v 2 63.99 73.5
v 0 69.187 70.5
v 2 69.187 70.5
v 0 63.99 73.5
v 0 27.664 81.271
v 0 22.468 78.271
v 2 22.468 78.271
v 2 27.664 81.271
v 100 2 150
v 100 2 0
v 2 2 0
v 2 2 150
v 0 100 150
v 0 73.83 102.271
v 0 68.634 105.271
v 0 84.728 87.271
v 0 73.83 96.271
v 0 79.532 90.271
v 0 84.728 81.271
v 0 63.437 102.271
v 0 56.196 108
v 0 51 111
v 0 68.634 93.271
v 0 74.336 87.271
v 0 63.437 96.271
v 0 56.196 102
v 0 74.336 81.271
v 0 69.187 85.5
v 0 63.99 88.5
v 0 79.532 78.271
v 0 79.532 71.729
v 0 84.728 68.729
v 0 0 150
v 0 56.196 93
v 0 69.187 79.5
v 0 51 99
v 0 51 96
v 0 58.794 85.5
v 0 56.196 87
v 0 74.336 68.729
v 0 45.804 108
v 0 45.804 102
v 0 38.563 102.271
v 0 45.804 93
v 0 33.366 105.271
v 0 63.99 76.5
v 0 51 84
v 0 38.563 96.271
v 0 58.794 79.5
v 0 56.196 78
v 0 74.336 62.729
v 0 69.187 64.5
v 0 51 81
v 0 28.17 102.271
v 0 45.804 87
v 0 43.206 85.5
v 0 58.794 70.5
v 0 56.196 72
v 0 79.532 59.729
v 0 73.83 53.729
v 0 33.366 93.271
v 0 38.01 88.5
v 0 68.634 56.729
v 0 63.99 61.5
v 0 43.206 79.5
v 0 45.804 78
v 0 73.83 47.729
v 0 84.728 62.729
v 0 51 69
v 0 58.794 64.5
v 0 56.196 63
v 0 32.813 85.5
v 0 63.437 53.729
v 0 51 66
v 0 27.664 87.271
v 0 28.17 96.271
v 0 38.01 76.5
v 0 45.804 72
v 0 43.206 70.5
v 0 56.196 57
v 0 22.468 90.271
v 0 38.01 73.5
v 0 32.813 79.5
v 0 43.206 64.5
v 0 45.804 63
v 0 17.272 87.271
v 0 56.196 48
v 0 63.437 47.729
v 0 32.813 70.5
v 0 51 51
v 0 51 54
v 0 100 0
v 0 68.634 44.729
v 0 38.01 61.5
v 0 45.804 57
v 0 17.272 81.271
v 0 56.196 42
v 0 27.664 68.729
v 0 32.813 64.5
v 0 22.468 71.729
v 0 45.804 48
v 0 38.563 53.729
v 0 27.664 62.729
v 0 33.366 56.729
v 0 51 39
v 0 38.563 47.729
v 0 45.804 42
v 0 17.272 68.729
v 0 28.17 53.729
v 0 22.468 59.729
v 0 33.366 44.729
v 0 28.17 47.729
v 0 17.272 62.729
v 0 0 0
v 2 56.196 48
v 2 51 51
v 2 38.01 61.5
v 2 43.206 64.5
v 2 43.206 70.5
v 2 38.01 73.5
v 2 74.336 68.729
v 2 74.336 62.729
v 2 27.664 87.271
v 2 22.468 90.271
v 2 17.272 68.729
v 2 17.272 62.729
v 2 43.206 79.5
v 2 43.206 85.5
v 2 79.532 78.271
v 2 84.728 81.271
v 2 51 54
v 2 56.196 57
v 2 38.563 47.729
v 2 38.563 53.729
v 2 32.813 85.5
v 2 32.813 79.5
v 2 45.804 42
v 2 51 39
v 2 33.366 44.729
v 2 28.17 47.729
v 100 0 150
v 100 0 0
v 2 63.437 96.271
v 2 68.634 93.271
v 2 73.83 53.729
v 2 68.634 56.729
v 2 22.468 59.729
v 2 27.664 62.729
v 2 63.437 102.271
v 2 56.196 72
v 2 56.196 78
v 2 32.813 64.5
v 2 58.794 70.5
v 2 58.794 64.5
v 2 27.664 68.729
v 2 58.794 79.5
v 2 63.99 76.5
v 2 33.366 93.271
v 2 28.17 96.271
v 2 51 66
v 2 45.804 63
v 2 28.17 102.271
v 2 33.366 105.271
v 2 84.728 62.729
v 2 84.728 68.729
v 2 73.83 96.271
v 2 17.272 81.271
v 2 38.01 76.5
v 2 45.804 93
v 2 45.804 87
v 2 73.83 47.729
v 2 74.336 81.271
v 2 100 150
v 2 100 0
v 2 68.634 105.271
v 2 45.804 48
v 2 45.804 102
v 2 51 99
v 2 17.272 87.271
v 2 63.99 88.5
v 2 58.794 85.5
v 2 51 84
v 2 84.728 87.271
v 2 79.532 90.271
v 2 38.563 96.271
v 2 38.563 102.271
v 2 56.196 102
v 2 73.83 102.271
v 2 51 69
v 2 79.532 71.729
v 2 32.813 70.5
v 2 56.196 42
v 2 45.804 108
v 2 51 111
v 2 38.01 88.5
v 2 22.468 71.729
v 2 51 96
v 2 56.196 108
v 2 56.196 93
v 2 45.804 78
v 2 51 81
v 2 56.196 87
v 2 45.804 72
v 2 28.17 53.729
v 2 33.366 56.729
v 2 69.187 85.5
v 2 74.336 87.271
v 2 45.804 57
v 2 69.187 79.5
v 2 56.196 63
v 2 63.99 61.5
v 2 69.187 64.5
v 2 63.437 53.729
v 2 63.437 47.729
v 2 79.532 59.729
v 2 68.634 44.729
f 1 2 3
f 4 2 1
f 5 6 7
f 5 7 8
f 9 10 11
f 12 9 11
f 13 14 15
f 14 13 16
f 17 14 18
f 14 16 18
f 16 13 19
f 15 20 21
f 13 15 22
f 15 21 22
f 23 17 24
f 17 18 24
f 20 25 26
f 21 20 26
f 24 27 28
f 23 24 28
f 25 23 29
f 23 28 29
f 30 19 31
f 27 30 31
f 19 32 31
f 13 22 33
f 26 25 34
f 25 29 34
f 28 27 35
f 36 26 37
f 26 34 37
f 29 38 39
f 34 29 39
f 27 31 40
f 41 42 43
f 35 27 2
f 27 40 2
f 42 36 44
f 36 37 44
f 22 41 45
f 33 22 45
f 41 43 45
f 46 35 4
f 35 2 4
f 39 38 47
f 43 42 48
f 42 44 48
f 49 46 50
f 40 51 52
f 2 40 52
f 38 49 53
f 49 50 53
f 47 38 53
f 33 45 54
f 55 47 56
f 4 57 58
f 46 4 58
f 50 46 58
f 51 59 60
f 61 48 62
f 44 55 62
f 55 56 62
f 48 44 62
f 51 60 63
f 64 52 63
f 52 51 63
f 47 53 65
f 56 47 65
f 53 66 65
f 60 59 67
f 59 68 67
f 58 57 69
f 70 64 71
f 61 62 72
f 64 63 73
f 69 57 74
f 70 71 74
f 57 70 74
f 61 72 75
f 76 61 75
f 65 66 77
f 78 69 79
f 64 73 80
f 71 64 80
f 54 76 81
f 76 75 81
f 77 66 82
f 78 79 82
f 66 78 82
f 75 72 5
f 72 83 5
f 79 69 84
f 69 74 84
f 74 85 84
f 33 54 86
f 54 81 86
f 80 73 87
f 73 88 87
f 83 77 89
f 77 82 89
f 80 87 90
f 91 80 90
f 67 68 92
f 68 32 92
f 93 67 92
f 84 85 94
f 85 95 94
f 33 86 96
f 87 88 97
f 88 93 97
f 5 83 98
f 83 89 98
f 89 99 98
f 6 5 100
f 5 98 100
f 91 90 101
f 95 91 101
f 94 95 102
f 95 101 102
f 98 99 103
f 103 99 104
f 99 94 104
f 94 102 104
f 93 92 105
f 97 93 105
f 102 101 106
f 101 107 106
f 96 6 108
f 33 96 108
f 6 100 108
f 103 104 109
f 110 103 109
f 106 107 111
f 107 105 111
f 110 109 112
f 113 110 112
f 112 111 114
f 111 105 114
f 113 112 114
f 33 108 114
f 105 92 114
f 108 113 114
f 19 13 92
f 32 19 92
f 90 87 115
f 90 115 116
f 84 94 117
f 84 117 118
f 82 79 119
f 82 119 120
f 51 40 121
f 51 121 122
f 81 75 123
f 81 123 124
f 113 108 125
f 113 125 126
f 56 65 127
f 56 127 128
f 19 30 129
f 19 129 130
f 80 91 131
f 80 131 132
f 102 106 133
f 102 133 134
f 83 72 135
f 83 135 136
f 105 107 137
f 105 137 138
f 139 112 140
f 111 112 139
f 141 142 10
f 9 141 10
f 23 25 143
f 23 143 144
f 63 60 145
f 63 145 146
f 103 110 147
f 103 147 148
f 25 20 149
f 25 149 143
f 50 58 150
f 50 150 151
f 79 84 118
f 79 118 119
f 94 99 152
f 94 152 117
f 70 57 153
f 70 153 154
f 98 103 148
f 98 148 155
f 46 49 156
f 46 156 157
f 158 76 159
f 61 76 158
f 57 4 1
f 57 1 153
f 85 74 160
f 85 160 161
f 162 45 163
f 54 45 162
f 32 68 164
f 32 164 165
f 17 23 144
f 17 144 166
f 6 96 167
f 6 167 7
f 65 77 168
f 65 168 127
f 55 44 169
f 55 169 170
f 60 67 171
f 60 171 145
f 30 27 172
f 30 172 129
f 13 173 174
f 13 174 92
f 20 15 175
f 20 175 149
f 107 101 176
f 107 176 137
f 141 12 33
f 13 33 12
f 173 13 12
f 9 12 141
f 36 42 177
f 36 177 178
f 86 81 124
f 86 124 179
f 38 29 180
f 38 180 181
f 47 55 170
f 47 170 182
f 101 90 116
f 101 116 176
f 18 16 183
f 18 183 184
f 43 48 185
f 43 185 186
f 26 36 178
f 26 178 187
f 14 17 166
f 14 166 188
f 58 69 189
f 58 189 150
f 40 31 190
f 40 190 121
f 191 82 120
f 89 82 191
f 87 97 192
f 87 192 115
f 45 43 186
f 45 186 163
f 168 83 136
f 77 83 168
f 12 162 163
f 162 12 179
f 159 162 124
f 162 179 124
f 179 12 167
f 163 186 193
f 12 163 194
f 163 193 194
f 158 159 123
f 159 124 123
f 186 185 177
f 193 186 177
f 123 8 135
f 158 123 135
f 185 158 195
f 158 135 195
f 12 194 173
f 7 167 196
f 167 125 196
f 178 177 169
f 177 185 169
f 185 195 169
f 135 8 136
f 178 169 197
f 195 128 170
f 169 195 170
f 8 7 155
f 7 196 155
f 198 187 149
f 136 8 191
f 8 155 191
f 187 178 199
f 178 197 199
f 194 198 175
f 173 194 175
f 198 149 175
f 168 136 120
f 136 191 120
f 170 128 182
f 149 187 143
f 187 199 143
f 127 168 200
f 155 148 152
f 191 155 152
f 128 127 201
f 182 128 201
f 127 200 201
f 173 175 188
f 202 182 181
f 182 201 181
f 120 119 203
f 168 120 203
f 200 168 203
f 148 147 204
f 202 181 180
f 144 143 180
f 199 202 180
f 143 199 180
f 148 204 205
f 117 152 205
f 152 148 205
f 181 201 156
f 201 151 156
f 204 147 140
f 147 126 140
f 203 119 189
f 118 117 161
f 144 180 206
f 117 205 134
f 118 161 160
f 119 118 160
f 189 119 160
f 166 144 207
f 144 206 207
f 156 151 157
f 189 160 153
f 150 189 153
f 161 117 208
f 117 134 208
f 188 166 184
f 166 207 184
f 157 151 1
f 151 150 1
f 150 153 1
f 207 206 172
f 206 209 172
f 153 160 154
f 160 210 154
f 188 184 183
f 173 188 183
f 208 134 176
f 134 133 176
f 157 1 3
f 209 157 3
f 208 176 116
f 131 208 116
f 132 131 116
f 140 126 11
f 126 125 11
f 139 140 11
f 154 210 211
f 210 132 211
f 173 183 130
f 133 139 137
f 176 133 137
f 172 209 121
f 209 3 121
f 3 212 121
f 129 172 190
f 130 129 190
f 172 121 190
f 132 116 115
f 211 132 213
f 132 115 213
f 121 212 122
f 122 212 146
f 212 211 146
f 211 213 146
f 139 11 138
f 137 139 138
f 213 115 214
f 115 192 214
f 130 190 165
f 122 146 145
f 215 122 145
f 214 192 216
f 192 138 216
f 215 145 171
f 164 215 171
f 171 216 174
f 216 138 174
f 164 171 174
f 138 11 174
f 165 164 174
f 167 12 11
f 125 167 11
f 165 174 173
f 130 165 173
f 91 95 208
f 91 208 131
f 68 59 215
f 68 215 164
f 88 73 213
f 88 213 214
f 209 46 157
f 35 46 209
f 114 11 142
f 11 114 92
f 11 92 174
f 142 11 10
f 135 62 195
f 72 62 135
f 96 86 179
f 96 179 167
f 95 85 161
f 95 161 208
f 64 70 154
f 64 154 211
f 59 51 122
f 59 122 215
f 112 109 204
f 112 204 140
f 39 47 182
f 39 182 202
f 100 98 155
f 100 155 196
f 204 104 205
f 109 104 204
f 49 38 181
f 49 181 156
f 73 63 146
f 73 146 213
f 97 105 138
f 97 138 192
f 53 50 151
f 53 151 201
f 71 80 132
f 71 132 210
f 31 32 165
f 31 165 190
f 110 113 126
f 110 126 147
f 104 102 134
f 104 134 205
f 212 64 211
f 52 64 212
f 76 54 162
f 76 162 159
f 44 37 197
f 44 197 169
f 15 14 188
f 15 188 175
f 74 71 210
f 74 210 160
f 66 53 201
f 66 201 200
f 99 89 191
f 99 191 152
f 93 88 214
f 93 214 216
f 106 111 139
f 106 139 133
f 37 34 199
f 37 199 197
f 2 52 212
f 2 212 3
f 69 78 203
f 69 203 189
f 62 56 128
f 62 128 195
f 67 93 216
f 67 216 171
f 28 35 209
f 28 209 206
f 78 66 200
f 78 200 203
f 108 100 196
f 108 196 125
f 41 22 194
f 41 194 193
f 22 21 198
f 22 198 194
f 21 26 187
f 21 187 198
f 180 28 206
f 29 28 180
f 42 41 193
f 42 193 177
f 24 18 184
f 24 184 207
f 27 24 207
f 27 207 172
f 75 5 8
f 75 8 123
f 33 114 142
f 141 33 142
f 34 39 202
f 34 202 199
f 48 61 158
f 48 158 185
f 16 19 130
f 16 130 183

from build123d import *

# Parameters (mm, degrees)
BOSS_EXTRUDE1_DEPTH = 150
FILL_PATTERN1_DEPTH = 2


# Read off the part's stored shape, not the designer's step: Fill Pattern1
with BuildPart() as part:
    # Sketch1 → Boss-Extrude1 (new body)
    with BuildSketch(Plane.XY):
        Polygon((0, 0), (100, 0), (100, 2), (2, 2), (2, 100), (0, 100), align=None)
    extrude(amount=BOSS_EXTRUDE1_DEPTH)

    # Fill Pattern1 outline → Fill Pattern1 (cut)
    with BuildSketch(Plane.YZ):
        Polygon((51, 81), (45.803847577, 78), (45.803847577, 72), (51, 69), (56.196152423, 72), (56.196152423, 78), align=None)
        Polygon((63.990381057, 88.5), (58.794228634, 85.5), (58.794228634, 79.5), (63.990381057, 76.5), (69.186533479, 79.5), (69.186533479, 85.5), align=None)
        Polygon((38.009618943, 73.5), (32.813466521, 70.5), (32.813466521, 64.5), (38.009618943, 61.5), (43.205771366, 64.5), (43.205771366, 70.5), align=None)
        Polygon((45.803847577, 63), (45.803847577, 57), (51, 54), (56.196152423, 57), (56.196152423, 63), (51, 66), align=None)
        Polygon((45.803847577, 108), (45.803847577, 102), (51, 99), (56.196152423, 102), (56.196152423, 108), (51, 111), align=None)
        Polygon((45.803847577, 93), (45.803847577, 87), (51, 84), (56.196152423, 87), (56.196152423, 93), (51, 96), align=None)
        Polygon((45.803847577, 48), (45.803847577, 42), (51, 39), (56.196152423, 42), (56.196152423, 48), (51, 51), align=None)
        Polygon((58.794228634, 64.5), (63.990381057, 61.5), (69.186533479, 64.5), (69.186533479, 70.5), (63.990381057, 73.5), (58.794228634, 70.5), align=None)
        Polygon((32.813466521, 79.5), (38.009618943, 76.5), (43.205771366, 79.5), (43.205771366, 85.5), (38.009618943, 88.5), (32.813466521, 85.5), align=None)
        Polygon((79.531695489, 90.270509831), (74.335543066, 87.270509831), (74.335543066, 81.270509831), (79.531695489, 78.270509831), (84.727847912, 81.270509831), (84.727847912, 87.270509831), align=None)
        Polygon((74.335543066, 68.729490169), (74.335543066, 62.729490169), (79.531695489, 59.729490169), (84.727847912, 62.729490169), (84.727847912, 68.729490169), (79.531695489, 71.729490169), align=None)
        Polygon((68.633557569, 105.270509831), (63.437405146, 102.270509831), (63.437405146, 96.270509831), (68.633557569, 93.270509831), (73.829709991, 96.270509831), (73.829709991, 102.270509831), align=None)
        Polygon((63.437405146, 53.729490169), (63.437405146, 47.729490169), (68.633557569, 44.729490169), (73.829709991, 47.729490169), (73.829709991, 53.729490169), (68.633557569, 56.729490169), align=None)
        Polygon((33.366442431, 105.270509831), (28.170290009, 102.270509831), (28.170290009, 96.270509831), (33.366442431, 93.270509831), (38.562594854, 96.270509831), (38.562594854, 102.270509831), align=None)
        Polygon((28.170290009, 53.729490169), (28.170290009, 47.729490169), (33.366442431, 44.729490169), (38.562594854, 47.729490169), (38.562594854, 53.729490169), (33.366442431, 56.729490169), align=None)
        Polygon((22.468304511, 90.270509831), (17.272152088, 87.270509831), (17.272152088, 81.270509831), (22.468304511, 78.270509831), (27.664456934, 81.270509831), (27.664456934, 87.270509831), align=None)
        Polygon((17.272152088, 68.729490169), (17.272152088, 62.729490169), (22.468304511, 59.729490169), (27.664456934, 62.729490169), (27.664456934, 68.729490169), (22.468304511, 71.729490169), align=None)
    extrude(amount=FILL_PATTERN1_DEPTH, mode=Mode.SUBTRACT)


solid = part.part
